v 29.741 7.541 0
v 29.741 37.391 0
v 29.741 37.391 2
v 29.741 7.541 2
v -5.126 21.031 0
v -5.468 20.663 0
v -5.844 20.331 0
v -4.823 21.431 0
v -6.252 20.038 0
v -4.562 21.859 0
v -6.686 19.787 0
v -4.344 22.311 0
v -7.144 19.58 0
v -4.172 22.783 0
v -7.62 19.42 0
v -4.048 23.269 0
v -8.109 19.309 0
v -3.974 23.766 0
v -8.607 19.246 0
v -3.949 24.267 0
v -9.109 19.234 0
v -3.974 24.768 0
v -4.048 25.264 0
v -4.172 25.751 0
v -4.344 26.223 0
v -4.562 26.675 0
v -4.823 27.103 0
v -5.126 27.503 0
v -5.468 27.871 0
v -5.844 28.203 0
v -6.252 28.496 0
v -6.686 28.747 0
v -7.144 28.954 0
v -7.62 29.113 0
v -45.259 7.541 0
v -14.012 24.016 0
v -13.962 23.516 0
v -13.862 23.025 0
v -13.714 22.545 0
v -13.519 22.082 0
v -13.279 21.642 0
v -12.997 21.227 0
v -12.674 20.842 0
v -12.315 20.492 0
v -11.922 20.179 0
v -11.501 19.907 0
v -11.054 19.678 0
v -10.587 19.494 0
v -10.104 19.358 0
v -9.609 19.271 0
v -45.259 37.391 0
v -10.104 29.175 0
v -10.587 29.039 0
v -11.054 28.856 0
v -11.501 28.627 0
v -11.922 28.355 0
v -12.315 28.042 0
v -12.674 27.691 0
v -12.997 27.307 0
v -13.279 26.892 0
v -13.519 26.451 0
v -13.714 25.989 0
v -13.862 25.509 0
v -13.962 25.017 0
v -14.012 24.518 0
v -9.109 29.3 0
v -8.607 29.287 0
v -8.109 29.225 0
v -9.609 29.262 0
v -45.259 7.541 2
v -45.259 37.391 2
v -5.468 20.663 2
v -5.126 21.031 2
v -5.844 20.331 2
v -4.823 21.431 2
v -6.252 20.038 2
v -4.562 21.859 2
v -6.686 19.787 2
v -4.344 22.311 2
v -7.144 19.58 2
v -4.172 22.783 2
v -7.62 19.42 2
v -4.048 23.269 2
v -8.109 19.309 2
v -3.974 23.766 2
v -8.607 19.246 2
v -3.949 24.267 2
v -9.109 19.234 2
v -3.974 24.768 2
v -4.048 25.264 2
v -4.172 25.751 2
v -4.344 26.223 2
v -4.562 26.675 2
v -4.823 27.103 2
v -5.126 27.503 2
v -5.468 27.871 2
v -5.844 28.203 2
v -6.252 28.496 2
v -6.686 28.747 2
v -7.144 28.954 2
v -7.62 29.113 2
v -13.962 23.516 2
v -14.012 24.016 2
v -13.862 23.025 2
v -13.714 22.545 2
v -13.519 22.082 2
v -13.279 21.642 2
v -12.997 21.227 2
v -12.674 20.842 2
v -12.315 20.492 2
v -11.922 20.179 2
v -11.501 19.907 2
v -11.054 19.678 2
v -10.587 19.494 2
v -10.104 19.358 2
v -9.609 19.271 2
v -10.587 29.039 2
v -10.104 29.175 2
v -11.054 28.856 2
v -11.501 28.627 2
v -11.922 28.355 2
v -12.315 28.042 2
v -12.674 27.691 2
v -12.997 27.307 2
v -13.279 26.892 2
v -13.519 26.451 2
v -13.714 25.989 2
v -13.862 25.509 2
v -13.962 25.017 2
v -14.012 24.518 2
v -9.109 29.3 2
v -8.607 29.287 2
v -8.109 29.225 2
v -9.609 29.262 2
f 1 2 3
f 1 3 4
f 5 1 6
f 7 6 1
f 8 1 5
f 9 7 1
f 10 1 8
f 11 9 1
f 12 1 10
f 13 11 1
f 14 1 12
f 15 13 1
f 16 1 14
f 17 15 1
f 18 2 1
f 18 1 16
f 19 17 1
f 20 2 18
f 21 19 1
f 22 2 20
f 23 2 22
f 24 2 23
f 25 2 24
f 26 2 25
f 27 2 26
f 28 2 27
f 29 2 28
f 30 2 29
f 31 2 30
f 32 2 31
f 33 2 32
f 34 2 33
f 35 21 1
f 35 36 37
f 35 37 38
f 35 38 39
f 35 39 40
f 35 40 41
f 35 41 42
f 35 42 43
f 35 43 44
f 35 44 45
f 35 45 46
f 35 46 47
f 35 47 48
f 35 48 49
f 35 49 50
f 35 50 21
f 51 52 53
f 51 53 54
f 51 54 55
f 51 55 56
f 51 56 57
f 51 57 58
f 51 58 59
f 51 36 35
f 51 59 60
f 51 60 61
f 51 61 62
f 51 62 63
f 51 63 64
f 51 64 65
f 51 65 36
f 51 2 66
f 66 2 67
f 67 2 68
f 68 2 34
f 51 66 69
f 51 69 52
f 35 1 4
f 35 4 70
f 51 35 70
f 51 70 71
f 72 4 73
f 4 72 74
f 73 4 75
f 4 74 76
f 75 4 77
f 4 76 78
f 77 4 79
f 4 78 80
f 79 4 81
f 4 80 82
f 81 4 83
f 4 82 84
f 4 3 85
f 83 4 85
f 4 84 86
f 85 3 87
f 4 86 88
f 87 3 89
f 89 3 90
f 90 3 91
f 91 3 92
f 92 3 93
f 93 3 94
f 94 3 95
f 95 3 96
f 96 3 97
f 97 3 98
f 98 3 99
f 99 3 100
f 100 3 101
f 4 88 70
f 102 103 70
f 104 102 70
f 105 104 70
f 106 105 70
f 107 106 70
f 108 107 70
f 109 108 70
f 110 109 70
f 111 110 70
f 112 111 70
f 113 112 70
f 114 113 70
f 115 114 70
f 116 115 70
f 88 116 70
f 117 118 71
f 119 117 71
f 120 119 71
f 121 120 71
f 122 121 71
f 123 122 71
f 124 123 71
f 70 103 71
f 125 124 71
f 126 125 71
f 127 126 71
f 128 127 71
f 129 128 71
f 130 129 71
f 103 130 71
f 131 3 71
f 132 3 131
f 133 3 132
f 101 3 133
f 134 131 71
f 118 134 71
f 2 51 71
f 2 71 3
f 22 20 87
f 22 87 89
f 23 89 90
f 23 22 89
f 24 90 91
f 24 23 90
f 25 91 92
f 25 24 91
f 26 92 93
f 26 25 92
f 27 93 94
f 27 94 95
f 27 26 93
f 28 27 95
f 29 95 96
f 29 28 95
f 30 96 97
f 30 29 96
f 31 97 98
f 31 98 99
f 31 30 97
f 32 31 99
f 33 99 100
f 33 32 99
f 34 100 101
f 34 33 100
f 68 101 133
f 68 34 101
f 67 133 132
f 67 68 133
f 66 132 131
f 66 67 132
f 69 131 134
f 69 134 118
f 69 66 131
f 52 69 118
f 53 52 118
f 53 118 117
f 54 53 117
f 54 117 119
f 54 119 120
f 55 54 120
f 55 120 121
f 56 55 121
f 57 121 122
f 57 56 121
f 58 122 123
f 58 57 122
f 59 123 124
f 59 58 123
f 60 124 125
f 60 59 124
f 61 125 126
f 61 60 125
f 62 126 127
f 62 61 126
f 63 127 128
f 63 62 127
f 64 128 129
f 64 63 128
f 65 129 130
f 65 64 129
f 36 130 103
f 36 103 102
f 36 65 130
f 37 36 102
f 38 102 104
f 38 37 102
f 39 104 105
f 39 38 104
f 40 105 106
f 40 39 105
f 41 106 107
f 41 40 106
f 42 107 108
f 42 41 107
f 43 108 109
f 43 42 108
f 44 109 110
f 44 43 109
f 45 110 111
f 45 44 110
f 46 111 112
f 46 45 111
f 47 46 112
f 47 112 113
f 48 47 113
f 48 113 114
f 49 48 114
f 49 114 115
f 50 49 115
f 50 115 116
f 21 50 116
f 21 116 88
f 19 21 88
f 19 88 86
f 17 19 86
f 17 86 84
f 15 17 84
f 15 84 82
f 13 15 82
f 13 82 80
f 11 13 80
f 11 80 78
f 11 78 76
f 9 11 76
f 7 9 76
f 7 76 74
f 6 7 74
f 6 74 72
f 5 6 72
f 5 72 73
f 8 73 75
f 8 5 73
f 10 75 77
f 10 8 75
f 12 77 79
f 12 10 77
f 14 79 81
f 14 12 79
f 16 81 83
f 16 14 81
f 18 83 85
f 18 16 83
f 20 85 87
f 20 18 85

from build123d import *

# Parameters (mm, degrees)
SKETCH1_R           = 5.034687392
BOSS_EXTRUDE1_DEPTH = 2


with BuildPart() as part:
    # Sketch1 → Boss-Extrude1 (new body)
    with BuildSketch(Plane.XY):
        Polygon((29.741294814, 7.540555765), (-45.258705186, 7.540555765), (-45.258705186, 37.390988743), (29.741294814, 37.390955861), align=None)
        with Locations((-8.98326267, 24.266867238)):
            Circle(SKETCH1_R, mode=Mode.SUBTRACT)
    extrude(amount=BOSS_EXTRUDE1_DEPTH)


solid = part.part
